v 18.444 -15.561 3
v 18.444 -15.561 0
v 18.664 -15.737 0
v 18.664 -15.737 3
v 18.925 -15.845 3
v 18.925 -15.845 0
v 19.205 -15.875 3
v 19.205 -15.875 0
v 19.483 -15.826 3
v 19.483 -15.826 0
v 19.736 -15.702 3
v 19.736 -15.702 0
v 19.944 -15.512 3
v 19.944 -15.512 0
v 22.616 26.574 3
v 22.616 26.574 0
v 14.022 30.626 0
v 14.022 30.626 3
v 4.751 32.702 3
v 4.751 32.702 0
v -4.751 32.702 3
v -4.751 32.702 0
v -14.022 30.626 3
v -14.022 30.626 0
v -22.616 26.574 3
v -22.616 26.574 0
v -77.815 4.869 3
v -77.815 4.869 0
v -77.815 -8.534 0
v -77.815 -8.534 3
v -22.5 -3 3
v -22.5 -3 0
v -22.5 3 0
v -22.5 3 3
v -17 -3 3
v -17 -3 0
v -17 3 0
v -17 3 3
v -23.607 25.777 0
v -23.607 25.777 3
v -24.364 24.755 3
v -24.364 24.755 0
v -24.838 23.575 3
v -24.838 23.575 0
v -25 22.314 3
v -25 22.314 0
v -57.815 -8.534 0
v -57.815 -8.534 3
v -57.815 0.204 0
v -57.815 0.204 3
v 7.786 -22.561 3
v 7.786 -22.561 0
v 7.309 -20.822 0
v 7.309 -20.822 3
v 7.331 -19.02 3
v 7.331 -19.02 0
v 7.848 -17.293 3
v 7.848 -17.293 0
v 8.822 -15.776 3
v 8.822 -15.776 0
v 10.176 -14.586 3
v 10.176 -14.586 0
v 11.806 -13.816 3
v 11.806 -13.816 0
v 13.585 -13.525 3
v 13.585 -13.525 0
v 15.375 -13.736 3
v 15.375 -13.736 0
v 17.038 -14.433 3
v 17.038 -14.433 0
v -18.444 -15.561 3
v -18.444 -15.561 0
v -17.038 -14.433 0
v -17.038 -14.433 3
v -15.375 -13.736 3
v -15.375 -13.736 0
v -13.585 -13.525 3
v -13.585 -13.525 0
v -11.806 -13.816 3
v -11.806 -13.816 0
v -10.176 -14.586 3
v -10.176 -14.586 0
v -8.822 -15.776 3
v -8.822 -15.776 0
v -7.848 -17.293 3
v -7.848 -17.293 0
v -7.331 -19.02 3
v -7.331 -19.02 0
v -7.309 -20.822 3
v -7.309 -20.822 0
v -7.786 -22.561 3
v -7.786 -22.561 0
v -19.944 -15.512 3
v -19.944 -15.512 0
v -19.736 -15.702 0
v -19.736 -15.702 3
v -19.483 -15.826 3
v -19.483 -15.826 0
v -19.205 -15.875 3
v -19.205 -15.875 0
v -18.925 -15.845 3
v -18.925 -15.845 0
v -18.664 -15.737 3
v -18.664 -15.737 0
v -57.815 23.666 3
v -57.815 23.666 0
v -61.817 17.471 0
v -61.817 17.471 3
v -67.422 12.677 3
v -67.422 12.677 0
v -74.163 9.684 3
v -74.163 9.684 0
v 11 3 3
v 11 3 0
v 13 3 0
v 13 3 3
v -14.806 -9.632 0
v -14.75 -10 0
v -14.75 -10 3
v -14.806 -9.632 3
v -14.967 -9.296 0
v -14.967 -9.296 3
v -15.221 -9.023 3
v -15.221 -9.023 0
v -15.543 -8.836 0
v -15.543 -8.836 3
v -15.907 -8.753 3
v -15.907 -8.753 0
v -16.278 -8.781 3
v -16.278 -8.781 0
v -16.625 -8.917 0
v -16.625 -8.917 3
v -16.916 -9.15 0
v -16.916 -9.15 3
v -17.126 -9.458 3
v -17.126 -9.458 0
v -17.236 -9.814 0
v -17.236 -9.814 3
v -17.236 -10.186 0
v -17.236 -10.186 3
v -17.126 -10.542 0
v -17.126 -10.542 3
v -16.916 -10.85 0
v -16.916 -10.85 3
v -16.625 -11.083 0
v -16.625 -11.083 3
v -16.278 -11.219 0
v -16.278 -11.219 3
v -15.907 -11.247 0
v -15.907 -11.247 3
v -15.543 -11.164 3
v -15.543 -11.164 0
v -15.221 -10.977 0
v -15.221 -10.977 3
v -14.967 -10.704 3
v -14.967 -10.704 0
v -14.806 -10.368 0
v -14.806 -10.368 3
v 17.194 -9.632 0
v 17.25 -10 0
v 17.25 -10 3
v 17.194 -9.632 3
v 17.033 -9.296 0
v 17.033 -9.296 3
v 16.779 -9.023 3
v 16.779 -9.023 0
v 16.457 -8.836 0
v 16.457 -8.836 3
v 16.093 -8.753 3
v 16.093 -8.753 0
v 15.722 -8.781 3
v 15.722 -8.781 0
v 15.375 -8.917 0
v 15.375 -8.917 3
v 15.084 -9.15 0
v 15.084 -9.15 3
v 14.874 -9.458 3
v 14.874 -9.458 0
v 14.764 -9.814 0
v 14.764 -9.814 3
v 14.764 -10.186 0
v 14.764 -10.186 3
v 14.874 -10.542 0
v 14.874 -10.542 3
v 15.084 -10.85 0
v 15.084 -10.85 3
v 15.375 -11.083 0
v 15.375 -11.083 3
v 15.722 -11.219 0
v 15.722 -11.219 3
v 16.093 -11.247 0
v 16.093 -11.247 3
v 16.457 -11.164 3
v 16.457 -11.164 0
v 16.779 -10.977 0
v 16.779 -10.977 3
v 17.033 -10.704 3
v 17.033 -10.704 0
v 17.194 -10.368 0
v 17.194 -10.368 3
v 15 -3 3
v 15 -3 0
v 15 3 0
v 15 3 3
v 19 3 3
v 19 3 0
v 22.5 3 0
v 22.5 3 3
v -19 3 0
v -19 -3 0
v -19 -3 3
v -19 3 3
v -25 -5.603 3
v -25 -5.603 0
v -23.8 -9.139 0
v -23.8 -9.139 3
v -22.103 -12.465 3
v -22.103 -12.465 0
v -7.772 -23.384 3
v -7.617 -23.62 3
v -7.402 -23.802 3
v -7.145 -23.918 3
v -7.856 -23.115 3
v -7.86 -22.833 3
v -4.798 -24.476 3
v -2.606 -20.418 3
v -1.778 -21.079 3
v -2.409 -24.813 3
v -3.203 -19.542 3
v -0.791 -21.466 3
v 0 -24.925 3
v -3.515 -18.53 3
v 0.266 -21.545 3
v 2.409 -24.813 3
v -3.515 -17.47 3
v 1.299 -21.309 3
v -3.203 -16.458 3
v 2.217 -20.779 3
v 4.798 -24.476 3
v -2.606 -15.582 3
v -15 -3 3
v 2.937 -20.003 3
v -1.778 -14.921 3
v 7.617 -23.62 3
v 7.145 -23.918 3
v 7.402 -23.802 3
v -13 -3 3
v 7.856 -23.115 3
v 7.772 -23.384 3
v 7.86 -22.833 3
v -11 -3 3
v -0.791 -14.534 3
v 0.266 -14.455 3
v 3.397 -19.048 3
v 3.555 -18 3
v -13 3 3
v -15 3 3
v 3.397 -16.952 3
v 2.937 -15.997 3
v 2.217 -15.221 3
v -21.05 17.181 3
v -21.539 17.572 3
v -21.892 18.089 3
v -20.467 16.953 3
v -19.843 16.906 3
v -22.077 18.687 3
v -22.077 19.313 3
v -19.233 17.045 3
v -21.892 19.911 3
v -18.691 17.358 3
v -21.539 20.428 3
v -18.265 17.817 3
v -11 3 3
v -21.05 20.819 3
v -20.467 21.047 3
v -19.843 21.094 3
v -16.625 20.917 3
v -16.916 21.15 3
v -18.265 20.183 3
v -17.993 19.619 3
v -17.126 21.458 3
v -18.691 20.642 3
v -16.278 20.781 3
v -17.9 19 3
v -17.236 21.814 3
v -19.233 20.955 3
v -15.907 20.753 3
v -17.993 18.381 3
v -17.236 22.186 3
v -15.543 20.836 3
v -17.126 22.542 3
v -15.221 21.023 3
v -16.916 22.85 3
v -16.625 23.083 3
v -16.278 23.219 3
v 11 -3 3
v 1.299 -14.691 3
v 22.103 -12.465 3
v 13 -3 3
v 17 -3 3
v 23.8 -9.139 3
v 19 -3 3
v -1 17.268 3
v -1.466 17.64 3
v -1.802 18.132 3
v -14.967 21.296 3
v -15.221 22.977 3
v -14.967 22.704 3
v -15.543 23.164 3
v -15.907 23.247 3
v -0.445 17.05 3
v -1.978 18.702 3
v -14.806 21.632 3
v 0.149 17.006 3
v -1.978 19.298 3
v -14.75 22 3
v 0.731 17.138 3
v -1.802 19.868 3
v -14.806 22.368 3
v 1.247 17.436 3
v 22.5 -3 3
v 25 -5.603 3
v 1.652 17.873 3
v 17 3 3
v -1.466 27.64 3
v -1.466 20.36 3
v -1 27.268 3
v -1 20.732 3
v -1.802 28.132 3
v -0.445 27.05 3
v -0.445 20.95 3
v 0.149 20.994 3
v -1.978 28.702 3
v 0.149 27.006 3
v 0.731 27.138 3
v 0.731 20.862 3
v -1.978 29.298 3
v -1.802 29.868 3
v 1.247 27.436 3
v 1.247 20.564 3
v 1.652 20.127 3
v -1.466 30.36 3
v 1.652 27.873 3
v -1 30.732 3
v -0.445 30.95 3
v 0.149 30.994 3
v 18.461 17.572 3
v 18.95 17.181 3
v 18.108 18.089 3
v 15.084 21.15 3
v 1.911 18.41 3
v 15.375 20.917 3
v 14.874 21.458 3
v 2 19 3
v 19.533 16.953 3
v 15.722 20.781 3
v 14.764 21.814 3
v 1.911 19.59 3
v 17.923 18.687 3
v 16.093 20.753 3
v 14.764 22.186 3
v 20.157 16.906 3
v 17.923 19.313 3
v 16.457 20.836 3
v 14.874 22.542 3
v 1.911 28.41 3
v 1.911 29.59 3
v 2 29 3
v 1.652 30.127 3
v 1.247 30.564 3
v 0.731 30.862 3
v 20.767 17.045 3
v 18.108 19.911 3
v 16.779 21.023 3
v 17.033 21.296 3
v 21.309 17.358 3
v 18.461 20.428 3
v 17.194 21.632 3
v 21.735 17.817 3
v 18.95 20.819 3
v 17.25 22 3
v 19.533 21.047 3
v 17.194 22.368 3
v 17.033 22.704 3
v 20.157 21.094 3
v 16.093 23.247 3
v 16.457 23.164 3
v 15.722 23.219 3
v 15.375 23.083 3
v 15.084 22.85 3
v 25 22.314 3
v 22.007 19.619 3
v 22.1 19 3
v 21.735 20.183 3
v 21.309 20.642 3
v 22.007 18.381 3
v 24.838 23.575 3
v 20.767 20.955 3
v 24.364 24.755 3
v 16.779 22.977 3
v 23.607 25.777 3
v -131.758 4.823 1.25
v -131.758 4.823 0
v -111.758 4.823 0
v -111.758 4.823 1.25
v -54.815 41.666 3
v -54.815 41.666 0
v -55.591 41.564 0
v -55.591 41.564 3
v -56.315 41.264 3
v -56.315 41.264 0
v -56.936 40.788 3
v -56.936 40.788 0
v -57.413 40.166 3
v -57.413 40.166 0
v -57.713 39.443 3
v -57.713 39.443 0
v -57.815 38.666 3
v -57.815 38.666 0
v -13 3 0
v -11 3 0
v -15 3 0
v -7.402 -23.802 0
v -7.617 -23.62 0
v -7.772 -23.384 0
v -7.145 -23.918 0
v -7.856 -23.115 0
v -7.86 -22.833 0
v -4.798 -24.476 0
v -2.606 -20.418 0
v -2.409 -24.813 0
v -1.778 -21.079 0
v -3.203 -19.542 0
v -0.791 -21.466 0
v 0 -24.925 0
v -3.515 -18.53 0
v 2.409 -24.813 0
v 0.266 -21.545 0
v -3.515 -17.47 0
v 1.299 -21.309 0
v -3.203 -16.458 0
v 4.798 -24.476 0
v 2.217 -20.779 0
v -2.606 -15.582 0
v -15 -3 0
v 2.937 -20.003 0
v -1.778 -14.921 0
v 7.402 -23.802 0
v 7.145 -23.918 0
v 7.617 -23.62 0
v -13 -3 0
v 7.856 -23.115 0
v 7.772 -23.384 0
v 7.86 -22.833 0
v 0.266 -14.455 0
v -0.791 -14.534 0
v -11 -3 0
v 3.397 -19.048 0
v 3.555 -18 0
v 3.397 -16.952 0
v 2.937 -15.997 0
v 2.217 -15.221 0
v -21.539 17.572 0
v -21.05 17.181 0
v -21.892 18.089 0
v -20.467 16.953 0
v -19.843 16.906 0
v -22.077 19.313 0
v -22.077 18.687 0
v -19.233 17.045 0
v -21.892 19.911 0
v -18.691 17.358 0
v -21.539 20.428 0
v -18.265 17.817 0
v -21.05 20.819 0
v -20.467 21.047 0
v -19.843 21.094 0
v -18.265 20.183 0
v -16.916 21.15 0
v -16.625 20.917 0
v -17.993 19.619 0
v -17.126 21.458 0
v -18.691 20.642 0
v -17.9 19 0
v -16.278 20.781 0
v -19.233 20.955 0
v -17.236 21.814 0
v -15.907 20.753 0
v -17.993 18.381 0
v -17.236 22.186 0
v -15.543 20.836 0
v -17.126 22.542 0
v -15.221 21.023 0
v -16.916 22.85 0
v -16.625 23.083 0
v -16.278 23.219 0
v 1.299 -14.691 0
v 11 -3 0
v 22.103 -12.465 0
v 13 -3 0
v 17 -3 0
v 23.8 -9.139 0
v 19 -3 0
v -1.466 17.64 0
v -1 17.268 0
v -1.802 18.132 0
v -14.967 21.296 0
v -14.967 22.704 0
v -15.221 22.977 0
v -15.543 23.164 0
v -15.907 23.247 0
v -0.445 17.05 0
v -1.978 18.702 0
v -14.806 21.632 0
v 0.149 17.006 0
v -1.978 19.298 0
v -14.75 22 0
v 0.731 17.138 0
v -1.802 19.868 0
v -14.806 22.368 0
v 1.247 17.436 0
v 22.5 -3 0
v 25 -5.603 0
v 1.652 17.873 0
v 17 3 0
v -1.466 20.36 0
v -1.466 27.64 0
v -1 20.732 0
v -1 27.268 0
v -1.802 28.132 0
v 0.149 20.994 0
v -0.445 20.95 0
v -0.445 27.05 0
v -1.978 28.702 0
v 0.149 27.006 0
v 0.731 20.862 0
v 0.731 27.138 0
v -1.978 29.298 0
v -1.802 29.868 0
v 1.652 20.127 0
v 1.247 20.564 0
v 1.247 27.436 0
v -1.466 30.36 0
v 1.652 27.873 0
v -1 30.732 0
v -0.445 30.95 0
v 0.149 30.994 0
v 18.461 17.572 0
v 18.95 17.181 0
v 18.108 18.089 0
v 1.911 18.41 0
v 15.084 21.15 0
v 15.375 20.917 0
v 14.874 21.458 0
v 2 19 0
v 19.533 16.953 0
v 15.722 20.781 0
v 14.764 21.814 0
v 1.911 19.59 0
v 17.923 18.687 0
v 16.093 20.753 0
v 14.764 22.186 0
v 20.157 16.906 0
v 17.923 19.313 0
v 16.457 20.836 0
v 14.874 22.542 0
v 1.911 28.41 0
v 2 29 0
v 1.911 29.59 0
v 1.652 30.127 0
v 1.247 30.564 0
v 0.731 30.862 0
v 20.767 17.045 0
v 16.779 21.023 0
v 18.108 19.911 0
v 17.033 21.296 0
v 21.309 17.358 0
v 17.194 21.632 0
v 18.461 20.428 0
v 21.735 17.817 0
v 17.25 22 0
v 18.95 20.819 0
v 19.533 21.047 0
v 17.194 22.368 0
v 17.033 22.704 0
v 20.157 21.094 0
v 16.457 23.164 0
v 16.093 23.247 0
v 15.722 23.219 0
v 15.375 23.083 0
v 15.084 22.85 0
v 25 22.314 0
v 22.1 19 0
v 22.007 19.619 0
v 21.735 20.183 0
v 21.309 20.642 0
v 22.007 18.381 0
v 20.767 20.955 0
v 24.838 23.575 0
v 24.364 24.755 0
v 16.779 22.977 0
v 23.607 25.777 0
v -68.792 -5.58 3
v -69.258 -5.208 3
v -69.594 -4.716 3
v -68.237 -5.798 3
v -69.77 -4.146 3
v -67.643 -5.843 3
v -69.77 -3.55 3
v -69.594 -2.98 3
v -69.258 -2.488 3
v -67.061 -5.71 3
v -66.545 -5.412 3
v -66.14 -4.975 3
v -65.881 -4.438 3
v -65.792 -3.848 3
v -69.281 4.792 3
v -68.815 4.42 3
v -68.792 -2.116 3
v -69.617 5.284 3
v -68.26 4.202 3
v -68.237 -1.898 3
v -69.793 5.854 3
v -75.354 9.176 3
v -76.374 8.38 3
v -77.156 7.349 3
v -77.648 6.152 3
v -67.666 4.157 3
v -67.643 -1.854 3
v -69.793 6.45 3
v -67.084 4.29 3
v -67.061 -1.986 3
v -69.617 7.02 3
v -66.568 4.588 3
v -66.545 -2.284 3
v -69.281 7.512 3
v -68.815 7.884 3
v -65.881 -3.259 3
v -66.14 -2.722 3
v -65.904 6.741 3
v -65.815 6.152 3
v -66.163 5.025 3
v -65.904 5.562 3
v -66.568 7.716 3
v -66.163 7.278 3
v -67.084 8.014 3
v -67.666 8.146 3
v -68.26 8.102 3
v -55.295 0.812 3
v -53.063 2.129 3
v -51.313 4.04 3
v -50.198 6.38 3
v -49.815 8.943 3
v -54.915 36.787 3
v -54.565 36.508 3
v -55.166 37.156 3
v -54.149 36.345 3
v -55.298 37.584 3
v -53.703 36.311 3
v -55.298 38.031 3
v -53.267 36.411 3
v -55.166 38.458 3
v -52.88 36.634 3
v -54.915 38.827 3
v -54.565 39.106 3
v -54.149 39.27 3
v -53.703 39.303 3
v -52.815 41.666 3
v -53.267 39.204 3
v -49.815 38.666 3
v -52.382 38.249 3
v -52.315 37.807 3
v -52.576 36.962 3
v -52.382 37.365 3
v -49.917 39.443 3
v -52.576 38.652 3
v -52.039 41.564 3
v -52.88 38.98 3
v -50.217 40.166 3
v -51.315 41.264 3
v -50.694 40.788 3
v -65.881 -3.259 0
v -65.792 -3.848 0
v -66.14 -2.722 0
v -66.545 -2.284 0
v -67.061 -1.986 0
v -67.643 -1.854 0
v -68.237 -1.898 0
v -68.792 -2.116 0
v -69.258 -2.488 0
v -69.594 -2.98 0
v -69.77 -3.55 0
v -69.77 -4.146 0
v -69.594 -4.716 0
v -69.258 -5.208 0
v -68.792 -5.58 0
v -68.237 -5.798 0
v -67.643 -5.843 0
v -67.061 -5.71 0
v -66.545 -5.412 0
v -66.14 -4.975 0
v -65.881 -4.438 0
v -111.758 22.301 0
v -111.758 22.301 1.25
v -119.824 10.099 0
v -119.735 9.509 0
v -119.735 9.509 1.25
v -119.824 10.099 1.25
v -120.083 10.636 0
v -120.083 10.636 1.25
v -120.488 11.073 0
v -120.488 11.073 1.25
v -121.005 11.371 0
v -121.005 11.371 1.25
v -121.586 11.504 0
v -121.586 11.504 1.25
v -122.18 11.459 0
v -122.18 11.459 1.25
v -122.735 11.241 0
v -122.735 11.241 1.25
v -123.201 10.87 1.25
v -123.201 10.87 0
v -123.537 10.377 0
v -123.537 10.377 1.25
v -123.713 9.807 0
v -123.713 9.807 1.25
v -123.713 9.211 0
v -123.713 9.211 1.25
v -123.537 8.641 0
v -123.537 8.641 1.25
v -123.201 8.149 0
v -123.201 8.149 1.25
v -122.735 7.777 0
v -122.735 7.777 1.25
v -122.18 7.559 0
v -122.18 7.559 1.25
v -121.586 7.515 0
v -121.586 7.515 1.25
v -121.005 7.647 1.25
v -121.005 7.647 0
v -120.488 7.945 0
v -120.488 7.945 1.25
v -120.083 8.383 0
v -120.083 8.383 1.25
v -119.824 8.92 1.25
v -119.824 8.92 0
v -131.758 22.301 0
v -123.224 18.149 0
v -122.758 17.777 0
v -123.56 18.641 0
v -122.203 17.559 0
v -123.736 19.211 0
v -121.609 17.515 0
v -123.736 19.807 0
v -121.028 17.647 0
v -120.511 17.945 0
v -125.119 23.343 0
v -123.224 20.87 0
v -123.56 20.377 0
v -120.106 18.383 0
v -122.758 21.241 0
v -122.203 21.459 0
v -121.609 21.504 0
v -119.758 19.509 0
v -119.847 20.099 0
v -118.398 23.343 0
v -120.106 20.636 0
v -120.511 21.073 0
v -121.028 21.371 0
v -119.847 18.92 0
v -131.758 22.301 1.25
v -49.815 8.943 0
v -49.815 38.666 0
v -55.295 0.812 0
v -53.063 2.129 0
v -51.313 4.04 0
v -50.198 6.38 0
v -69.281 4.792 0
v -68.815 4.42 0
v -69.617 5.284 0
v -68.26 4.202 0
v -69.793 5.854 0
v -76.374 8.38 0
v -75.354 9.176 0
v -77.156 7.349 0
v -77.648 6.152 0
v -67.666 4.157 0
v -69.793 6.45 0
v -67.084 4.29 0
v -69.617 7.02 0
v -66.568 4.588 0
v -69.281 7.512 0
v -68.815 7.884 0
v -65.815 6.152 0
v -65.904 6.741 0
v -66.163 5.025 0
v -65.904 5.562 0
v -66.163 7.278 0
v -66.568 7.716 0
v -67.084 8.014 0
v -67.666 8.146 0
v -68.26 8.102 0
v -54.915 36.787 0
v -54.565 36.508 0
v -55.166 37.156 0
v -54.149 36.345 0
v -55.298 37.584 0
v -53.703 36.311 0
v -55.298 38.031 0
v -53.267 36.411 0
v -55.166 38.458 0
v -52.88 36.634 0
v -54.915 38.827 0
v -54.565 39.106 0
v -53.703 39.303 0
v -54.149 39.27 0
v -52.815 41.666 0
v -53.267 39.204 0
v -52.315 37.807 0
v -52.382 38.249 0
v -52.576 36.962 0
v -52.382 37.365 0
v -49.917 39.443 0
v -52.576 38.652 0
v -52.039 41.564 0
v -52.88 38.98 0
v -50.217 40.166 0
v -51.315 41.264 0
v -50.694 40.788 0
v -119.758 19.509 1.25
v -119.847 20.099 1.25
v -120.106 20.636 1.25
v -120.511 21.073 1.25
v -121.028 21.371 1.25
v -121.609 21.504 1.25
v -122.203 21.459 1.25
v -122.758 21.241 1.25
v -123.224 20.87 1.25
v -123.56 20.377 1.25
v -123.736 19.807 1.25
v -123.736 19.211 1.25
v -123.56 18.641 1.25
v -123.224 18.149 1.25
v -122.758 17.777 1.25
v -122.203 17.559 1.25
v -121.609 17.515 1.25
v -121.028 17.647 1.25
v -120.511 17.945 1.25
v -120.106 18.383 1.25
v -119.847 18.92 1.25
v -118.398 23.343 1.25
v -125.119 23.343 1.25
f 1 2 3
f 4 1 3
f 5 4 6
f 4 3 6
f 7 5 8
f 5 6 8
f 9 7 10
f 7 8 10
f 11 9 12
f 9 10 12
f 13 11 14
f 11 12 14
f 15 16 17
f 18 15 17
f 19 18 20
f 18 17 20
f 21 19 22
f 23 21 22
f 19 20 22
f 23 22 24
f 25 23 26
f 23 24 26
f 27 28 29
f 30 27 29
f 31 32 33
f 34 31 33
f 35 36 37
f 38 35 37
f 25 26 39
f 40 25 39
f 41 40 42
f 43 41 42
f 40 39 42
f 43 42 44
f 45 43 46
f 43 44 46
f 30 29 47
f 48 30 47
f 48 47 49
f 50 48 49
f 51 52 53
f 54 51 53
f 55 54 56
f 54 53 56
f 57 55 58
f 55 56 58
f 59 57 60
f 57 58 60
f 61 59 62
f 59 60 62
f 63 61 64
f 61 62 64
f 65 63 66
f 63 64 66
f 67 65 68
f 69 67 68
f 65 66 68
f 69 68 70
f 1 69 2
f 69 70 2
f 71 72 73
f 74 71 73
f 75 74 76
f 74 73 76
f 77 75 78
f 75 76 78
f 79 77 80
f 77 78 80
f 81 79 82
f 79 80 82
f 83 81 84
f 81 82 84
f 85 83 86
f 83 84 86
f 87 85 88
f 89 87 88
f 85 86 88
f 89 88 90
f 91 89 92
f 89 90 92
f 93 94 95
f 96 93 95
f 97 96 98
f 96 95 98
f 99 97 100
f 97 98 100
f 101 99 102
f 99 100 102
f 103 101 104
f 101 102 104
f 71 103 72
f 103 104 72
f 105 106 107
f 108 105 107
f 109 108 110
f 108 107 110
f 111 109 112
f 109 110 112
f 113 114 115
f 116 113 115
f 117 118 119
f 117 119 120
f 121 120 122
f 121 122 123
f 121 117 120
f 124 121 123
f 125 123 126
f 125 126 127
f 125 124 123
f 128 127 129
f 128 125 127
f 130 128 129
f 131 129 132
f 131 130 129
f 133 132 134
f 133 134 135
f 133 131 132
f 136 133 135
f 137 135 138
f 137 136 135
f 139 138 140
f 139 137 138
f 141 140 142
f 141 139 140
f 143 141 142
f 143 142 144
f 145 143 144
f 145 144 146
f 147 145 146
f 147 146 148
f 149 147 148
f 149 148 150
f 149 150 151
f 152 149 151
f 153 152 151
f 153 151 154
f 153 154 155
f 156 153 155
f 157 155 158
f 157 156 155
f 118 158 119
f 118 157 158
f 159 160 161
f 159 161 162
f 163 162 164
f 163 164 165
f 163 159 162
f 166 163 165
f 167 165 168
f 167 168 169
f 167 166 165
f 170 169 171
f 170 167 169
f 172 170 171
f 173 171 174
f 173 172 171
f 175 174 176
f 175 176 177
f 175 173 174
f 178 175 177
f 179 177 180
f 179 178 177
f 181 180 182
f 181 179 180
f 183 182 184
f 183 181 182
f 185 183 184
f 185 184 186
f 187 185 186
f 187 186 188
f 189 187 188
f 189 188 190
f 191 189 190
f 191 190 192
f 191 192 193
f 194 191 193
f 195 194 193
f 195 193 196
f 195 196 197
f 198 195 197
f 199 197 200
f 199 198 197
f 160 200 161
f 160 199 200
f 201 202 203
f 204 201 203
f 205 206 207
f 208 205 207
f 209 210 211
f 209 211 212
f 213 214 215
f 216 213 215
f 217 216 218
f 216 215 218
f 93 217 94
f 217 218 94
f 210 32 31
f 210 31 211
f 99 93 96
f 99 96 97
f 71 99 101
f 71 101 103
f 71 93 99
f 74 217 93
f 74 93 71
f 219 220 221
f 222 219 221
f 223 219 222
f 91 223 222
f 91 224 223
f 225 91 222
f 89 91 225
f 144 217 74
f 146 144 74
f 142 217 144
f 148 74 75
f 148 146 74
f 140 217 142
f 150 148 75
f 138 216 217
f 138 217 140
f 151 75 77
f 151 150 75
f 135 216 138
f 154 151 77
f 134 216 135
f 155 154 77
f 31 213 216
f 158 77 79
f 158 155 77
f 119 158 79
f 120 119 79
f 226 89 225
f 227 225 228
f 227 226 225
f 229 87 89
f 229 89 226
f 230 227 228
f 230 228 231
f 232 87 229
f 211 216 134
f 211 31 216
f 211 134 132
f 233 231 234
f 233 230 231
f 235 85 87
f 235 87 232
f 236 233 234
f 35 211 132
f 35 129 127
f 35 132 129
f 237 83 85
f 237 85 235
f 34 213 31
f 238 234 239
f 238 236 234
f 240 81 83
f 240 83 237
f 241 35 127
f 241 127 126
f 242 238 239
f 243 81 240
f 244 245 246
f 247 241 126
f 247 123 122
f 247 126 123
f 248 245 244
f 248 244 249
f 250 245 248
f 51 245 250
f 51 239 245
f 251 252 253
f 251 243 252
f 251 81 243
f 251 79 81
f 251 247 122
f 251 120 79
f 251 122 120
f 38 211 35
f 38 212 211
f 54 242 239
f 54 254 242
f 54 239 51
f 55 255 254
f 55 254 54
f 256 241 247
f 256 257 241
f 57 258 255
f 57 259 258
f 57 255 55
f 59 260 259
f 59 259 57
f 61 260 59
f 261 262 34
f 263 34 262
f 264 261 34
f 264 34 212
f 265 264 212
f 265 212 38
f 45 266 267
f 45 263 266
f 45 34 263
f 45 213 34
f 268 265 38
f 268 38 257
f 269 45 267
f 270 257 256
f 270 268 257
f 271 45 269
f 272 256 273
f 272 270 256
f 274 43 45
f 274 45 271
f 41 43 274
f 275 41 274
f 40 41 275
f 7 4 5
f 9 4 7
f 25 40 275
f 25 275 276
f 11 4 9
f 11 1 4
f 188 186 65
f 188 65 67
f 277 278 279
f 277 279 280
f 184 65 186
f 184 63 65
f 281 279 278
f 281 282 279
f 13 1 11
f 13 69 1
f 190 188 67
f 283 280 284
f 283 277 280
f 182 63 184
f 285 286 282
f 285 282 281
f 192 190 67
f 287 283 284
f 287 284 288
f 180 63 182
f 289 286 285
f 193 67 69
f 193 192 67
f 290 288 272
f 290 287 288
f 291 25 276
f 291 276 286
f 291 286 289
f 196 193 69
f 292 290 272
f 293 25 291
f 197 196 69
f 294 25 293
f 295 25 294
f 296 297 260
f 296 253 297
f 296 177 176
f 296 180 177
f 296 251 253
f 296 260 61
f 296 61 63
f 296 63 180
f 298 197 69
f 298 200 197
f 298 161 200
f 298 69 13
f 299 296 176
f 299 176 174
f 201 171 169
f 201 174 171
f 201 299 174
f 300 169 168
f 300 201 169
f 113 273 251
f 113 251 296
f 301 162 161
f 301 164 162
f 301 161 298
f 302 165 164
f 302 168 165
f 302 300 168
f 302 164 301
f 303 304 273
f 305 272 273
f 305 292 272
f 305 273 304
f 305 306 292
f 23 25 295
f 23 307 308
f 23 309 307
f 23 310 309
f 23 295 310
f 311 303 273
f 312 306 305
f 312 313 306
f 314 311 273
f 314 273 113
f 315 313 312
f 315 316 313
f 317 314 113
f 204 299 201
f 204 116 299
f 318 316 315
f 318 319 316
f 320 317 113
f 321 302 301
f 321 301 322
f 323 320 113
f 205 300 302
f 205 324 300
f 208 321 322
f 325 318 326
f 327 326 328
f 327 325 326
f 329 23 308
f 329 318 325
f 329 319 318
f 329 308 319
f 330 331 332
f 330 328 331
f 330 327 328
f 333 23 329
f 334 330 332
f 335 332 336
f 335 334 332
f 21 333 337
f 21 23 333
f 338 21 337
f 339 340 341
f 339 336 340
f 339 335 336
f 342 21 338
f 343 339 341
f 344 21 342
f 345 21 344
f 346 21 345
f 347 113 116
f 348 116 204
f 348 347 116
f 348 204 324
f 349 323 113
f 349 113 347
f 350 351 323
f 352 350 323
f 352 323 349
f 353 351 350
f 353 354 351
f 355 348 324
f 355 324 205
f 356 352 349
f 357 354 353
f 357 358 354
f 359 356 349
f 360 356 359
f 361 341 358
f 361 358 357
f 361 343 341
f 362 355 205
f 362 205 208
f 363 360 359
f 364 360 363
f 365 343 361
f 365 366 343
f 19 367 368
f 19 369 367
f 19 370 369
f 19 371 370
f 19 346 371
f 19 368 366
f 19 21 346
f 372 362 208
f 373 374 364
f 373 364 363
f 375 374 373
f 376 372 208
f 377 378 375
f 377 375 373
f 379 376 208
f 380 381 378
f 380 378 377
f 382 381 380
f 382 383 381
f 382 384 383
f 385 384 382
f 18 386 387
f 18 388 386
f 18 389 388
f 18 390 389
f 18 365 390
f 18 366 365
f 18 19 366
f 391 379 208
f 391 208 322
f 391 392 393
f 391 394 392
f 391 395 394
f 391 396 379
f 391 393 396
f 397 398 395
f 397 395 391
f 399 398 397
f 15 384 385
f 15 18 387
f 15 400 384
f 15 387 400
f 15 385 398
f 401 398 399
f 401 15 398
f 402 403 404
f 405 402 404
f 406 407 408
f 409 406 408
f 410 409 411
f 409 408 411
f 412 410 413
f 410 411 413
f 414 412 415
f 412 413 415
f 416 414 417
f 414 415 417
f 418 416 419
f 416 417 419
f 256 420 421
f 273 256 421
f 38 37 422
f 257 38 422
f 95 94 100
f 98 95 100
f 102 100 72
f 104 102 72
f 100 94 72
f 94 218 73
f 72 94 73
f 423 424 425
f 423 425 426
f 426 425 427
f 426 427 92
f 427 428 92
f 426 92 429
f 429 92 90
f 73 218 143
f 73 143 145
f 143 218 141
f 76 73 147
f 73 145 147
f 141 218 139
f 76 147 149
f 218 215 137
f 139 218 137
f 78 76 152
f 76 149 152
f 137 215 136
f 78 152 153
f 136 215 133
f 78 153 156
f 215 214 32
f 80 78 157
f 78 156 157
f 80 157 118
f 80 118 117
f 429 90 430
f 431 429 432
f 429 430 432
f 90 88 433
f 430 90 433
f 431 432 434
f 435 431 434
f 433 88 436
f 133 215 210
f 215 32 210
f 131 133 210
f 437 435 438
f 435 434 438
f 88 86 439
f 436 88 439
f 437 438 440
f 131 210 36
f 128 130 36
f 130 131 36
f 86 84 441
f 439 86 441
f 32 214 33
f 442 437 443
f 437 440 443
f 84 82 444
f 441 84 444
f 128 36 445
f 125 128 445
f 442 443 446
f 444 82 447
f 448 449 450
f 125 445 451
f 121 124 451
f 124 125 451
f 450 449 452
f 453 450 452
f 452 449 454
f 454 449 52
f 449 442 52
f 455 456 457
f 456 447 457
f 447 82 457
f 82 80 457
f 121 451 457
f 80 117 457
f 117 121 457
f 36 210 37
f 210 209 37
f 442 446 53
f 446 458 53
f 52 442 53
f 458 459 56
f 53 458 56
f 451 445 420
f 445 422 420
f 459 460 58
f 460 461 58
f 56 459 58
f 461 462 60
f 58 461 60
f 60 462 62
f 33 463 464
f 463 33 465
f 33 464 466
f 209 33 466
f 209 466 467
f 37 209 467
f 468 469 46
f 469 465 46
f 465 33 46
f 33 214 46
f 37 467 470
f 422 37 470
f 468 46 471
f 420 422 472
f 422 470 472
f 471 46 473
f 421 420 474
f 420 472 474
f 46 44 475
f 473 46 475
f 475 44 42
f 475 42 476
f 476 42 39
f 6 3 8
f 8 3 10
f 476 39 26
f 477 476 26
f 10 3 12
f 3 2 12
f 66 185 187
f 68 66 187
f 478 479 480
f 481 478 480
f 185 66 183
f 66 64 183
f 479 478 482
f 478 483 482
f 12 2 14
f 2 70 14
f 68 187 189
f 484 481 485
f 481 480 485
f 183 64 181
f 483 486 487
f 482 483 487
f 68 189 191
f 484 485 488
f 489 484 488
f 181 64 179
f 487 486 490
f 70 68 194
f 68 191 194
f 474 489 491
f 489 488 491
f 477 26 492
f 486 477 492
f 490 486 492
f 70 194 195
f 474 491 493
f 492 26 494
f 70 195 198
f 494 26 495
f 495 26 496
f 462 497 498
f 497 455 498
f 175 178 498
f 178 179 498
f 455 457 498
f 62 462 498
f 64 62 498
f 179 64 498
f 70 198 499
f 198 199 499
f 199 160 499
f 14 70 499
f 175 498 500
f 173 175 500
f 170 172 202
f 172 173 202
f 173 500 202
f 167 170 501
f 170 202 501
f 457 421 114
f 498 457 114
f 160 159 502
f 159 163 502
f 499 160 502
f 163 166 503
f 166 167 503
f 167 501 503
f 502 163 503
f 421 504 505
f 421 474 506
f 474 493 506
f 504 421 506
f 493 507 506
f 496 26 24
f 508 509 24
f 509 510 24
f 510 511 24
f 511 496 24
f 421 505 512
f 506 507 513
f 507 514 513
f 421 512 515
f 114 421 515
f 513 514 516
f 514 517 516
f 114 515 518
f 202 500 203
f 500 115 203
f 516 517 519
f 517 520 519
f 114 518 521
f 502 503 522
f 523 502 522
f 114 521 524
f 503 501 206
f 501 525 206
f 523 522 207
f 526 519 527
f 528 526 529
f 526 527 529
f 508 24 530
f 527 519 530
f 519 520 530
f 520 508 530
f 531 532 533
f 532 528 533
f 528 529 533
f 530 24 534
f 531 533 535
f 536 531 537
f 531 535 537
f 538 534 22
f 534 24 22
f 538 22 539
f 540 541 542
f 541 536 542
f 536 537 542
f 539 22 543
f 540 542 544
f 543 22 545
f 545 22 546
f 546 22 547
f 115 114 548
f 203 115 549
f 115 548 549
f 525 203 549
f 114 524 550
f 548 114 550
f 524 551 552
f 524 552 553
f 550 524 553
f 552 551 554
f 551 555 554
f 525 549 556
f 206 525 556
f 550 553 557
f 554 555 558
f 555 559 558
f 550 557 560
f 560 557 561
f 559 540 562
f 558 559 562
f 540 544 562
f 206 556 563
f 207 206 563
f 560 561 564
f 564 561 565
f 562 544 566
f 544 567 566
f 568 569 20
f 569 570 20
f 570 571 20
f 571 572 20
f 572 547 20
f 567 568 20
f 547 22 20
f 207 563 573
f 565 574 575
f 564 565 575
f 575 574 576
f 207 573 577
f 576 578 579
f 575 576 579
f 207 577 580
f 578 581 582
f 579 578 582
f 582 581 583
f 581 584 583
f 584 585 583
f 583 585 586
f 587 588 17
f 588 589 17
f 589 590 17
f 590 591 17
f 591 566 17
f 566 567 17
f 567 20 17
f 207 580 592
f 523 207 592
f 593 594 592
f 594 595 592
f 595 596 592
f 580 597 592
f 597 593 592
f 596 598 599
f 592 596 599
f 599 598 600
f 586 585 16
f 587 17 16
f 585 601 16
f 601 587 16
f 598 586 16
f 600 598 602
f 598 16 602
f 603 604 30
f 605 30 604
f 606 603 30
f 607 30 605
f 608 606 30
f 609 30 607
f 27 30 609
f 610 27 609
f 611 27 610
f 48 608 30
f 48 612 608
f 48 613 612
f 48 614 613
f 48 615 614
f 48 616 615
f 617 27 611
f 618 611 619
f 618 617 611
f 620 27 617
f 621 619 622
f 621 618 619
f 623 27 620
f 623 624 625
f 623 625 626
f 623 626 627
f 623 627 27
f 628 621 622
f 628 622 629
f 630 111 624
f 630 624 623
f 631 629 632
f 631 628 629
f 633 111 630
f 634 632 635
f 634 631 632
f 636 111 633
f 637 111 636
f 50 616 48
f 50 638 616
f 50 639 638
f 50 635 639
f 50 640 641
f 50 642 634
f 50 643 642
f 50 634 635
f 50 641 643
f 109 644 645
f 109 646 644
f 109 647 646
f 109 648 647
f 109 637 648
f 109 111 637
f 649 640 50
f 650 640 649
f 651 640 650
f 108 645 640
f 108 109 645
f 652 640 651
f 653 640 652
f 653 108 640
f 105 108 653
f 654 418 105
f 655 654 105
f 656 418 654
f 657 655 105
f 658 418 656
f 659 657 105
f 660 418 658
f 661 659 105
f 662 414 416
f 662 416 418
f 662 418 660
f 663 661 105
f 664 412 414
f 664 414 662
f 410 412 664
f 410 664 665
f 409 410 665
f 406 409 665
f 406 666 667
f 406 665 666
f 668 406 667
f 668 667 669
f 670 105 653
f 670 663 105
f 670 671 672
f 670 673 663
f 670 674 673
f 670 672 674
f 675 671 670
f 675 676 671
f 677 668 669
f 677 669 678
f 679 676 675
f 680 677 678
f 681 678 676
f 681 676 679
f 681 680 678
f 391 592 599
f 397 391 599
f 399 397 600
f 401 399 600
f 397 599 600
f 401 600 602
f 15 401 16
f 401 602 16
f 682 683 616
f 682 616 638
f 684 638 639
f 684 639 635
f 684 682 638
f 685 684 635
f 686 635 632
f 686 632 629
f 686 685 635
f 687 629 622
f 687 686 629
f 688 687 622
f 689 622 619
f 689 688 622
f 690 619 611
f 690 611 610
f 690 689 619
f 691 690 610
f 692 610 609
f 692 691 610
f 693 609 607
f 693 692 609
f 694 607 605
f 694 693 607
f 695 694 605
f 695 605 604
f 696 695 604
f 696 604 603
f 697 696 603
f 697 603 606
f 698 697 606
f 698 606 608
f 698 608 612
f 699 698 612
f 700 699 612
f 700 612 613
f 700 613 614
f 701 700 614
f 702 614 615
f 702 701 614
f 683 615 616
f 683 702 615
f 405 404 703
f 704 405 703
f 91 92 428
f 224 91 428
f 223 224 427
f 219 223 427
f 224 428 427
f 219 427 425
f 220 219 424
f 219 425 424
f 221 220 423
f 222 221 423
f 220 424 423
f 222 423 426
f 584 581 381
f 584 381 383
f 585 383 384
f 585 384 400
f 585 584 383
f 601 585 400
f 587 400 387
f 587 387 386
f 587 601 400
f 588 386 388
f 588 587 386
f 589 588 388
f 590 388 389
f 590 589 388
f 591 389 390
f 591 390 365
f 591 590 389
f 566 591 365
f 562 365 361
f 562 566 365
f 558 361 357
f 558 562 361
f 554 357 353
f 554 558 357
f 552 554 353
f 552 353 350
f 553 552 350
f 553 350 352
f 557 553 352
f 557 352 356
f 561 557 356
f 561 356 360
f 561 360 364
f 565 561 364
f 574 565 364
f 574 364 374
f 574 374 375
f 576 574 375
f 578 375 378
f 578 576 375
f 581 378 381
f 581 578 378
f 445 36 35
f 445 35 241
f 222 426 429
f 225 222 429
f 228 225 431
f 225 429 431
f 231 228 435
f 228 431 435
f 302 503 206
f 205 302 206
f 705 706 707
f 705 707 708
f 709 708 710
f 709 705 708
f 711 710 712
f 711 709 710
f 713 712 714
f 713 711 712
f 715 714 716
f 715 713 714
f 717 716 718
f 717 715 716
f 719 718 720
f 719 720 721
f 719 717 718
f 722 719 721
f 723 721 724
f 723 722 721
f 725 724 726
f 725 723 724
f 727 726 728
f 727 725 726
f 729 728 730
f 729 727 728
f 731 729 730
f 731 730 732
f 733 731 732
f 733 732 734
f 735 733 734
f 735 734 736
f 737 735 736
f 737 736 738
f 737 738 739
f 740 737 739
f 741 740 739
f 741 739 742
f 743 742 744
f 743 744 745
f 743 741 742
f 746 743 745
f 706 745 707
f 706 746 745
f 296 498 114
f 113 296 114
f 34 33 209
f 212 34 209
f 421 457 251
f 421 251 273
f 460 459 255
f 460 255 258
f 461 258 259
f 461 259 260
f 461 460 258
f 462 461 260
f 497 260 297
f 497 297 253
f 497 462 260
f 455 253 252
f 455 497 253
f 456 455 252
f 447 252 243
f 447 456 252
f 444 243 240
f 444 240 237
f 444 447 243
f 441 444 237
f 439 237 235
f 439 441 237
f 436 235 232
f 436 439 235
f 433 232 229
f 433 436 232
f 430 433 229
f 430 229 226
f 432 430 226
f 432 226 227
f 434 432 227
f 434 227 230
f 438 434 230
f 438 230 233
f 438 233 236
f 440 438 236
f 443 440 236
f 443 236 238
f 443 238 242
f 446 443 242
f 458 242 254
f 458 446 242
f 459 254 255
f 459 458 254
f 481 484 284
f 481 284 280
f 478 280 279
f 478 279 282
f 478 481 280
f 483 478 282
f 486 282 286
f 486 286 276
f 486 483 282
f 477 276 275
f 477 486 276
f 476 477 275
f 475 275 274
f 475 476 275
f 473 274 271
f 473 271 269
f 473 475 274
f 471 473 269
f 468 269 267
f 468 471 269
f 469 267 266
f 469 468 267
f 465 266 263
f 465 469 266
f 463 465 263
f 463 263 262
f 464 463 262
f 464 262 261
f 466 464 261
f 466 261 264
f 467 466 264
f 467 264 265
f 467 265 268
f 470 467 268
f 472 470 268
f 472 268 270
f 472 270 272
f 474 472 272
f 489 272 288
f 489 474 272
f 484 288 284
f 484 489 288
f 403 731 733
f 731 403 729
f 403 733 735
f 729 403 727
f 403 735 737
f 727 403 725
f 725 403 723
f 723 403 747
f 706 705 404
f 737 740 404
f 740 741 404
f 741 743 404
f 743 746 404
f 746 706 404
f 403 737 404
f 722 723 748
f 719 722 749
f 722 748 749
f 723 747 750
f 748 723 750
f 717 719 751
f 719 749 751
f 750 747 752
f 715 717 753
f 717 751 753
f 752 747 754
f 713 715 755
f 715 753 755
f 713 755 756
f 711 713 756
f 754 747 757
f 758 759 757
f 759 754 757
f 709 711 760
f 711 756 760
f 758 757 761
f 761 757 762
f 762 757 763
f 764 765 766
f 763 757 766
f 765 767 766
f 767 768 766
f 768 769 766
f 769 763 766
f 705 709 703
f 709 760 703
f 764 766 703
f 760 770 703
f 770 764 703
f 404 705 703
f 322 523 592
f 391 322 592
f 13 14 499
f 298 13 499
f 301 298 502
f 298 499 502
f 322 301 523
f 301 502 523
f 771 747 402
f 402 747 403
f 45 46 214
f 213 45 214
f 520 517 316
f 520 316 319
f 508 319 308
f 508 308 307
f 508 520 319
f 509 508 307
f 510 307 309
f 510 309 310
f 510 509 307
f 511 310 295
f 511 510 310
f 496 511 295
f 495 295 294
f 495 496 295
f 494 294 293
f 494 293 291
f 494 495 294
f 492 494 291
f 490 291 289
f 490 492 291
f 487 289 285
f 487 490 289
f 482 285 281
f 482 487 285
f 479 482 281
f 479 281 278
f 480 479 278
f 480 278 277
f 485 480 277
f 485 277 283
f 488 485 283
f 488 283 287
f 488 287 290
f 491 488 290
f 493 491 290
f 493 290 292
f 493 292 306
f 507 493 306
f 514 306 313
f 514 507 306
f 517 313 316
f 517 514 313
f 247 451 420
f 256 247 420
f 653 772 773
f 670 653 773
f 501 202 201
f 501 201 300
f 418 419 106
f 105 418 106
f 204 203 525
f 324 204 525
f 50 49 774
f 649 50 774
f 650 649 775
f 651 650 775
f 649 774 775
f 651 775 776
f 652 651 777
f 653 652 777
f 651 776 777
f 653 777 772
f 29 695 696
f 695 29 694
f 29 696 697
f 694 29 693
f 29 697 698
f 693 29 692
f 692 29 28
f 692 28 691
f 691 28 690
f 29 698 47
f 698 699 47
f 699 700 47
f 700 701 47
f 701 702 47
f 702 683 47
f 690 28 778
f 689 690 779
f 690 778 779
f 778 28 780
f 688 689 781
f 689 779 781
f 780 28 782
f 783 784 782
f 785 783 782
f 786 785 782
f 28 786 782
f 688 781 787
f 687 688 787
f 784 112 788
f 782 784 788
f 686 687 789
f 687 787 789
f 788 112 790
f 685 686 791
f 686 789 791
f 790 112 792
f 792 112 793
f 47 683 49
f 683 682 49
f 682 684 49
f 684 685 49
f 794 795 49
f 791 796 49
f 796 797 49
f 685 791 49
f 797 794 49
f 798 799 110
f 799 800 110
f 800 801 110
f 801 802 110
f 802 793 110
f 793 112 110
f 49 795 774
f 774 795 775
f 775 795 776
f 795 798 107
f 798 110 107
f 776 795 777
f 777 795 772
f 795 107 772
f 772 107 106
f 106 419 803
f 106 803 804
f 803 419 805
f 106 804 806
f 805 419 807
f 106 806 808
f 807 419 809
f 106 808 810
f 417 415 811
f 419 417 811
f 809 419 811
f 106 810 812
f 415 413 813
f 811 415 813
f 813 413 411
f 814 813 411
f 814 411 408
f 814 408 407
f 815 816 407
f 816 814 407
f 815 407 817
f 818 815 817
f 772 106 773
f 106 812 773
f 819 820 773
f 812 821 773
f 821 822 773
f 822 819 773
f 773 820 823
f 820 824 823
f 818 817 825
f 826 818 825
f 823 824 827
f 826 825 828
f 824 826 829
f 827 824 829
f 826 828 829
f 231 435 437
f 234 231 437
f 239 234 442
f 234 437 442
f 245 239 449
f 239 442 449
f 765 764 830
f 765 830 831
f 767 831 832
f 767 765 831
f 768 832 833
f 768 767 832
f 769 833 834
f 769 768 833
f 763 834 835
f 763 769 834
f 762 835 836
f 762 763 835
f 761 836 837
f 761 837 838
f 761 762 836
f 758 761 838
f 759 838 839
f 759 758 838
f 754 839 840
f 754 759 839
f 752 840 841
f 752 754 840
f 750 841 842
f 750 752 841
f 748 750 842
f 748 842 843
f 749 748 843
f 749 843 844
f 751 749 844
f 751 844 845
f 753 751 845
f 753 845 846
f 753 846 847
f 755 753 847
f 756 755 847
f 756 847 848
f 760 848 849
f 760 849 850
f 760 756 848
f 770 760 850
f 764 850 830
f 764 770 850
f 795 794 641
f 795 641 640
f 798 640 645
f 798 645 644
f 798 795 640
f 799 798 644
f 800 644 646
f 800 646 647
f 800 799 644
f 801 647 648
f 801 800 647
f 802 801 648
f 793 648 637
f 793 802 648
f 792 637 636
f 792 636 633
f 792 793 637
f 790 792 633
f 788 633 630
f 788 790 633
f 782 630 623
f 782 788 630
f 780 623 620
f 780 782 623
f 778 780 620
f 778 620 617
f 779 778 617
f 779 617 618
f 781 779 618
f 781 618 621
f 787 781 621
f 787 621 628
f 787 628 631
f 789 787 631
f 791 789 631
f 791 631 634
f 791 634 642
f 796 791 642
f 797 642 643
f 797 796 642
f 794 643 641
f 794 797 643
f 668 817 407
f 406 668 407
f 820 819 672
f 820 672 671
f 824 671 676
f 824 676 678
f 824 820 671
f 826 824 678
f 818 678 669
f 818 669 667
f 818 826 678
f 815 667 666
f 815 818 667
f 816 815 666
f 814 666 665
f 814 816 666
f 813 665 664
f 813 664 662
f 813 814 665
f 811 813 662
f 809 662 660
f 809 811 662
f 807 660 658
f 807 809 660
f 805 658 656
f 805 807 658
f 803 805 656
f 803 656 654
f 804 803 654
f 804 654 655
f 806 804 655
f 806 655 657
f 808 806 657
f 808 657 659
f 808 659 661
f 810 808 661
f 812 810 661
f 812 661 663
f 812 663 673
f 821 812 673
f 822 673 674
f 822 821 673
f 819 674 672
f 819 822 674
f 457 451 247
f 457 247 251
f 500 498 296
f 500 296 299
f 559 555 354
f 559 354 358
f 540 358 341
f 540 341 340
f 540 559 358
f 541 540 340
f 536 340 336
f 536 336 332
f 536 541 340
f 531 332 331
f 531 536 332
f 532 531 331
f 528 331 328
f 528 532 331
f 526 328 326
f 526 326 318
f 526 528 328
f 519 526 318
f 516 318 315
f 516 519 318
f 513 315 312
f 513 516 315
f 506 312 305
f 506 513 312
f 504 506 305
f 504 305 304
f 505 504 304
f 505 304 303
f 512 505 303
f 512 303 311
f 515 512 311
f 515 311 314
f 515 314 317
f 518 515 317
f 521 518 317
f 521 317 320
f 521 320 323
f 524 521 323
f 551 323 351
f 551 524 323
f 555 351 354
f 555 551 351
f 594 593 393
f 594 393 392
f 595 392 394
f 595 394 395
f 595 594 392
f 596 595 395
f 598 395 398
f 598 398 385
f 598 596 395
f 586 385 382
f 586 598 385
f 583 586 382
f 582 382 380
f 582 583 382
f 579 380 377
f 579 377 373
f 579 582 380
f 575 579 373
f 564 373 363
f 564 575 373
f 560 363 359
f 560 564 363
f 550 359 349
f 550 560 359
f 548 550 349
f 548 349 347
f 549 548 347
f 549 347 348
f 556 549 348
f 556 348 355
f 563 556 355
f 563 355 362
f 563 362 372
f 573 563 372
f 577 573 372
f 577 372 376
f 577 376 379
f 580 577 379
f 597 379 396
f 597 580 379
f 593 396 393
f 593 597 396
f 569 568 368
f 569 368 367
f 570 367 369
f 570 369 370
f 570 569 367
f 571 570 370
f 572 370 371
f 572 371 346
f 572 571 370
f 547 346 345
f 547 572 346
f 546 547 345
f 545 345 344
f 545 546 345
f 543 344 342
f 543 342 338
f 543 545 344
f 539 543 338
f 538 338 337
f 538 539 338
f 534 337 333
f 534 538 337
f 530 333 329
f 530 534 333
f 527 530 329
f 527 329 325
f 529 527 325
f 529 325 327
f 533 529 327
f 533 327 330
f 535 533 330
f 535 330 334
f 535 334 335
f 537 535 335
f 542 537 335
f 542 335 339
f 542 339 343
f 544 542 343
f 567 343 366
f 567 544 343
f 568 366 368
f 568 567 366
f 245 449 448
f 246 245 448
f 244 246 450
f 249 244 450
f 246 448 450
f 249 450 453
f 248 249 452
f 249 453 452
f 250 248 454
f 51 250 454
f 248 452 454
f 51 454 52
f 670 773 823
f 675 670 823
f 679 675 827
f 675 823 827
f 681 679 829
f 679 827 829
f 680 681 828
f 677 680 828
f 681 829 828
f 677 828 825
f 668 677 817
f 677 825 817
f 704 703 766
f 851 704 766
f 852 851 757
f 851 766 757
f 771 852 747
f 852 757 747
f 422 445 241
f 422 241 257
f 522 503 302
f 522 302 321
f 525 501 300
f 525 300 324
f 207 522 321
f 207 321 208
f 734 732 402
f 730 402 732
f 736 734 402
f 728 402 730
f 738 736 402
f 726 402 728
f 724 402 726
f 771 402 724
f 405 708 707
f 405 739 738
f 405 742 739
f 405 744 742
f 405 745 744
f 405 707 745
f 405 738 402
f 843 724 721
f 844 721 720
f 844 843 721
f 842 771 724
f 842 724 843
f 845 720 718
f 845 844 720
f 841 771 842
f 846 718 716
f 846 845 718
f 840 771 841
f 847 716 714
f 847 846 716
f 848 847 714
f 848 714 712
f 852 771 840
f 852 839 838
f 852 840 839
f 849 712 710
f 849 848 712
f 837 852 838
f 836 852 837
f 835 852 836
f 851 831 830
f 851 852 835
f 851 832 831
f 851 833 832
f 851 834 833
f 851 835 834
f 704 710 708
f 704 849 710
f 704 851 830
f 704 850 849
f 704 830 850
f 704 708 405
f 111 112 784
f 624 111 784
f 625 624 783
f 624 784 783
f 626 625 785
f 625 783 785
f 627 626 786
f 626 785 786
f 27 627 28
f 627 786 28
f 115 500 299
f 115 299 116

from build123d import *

# Parameters (mm, degrees)
F0_R     = 1.25
F0_R_2   = 3.555
F0_W     = 3.5
F0_H     = 6
F0_W_2   = 2
F0_R_3   = 2.1
F0_R_4   = 2
F1_DEPTH = 3
F0_R_5   = 1.5
F2_DEPTH = 3
F4_R     = 2.1
F4_R_2   = 2.25
F5_DEPTH = 25
F6_DEPTH = 1.25


# Not quite as in the source:
# - a feature names something its author has since deleted; it is built from what else it names


with BuildPart() as f1:
    # F0 (on Top) → F1 (new body)
    with BuildSketch(Plane.XY):
        with BuildLine():
            Line((25, 14.3136761677), (-25, 14.3136761677))
            Line((-25, 14.3136761677), (-25, -5.6028405869))
            ThreePointArc((-25, -5.6028405869), (-23.0117824833, -10.8325706042), (-19.9442440013, -15.5115974911))
            ThreePointArc((-19.9442440013, -15.5115974911), (-19.2052482882, -15.8754446325), (-18.443850882, -15.5611622815))
            ThreePointArc((-18.443850882, -15.5611622815), (-10.1760612052, -14.5858281895), (-7.7862204272, -22.5605560084))
            ThreePointArc((-7.7862204272, -22.5605560084), (-7.7721201862, -23.38414607), (-7.1446119827, -23.9177497252))
            ThreePointArc((-7.1446119827, -23.9177497252), (-3.6076561704, -24.6722072912), (0, -24.9253467642))
            ThreePointArc((0, -24.9253467642), (3.6076561704, -24.6722072912), (7.1446119827, -23.9177497252))
            ThreePointArc((7.1446119827, -23.9177497252), (7.7721201862, -23.38414607), (7.7862204272, -22.5605560084))
            ThreePointArc((7.7862204272, -22.5605560084), (10.1760612052, -14.5858281895), (18.443850882, -15.5611622815))
            ThreePointArc((18.443850882, -15.5611622815), (19.2052482882, -15.8754446325), (19.9442440013, -15.5115974911))
            ThreePointArc((19.9442440013, -15.5115974911), (23.0117824833, -10.8325706042), (25, -5.6028405869))
            Line((25, -5.6028405869), (25, 14.3136761677))
        make_face()
        with Locations((-16, -10)):
            Circle(F0_R, mode=Mode.SUBTRACT)
        with Locations((0, -18)):
            Circle(F0_R_2, mode=Mode.SUBTRACT)
        with Locations((16, -10)):
            Circle(F0_R, mode=Mode.SUBTRACT)
        with Locations((-20.75, 0)):
            Rectangle(F0_W, F0_H, mode=Mode.SUBTRACT)
        with Locations((-16, 0)):
            Rectangle(F0_W_2, F0_H, mode=Mode.SUBTRACT)
        with Locations((-12, 0)):
            Rectangle(F0_W_2, F0_H, mode=Mode.SUBTRACT)
        with Locations((12, 0)):
            Rectangle(F0_W_2, F0_H, mode=Mode.SUBTRACT)
        with Locations((16, 0)):
            Rectangle(F0_W_2, F0_H, mode=Mode.SUBTRACT)
        with Locations((20.75, 0)):
            Rectangle(F0_W, F0_H, mode=Mode.SUBTRACT)
        with BuildLine():
            ThreePointArc((-22.6164226719, 26.5744662824), (-24.3636059263, 24.7547708647), (-25, 22.3136761677))
            Line((-25, 22.3136761677), (-25, 14.3136761677))
            Line((-25, 14.3136761677), (25, 14.3136761677))
            Line((25, 14.3136761677), (25, 22.3136761677))
            ThreePointArc((25, 22.3136761677), (24.3636059263, 24.7547708647), (22.6164226719, 26.5744662824))
            ThreePointArc((22.6164226719, 26.5744662824), (0, 32.964214922), (-22.6164226719, 26.5744662824))
        make_face()
        with Locations((-20, 19)):
            Circle(F0_R_3, mode=Mode.SUBTRACT)
        with Locations((-16, 22)):
            Circle(F0_R, mode=Mode.SUBTRACT)
        with Locations((0, 19)):
            Circle(F0_R_4, mode=Mode.SUBTRACT)
        with Locations((20, 19)):
            Circle(F0_R_3, mode=Mode.SUBTRACT)
        with Locations((16, 22)):
            Circle(F0_R, mode=Mode.SUBTRACT)
        with Locations((0, 29)):
            Circle(F0_R_4, mode=Mode.SUBTRACT)
    extrude(amount=F1_DEPTH)


with BuildPart() as f1b:
    # F0 (on Top) → F1, piece 2 (new body)
    with BuildSketch(Plane.XY):
        with BuildLine():
            Line((-77.8149985122, 4.86868793), (-77.8149985122, -8.5344709849))
            Line((-77.8149985122, -8.5344709849), (-57.8149985122, -8.5344709849))
            Line((-57.8149985122, -8.5344709849), (-57.8149985122, 0.2044082856))
            ThreePointArc((-57.8149985122, 0.2044082856), (-52.1170226198, 3.0194368328), (-49.8149985122, 8.9432869322))
            Line((-49.8149985122, 8.9432869322), (-49.8149985122, 38.6662318432))
            ThreePointArc((-49.8149985122, 38.6662318432), (-50.6936781686, 40.7875521867), (-52.8149985122, 41.6662318432))
            Line((-52.8149985122, 41.6662318432), (-54.8149985122, 41.6662318432))
            ThreePointArc((-54.8149985122, 41.6662318432), (-56.9363188557, 40.7875521867), (-57.8149985122, 38.6662318432))
            Line((-57.8149985122, 38.6662318432), (-57.8149985122, 23.6662318432))
            ThreePointArc((-57.8149985122, 23.6662318432), (-64.445474594, 14.8702366754), (-74.1630322412, 9.6835404787))
            ThreePointArc((-74.1630322412, 9.6835404787), (-76.798725953, 7.8902629626), (-77.8149985122, 4.86868793))
        make_face()
        with Locations((-67.7919896514, -3.8481471525)):
            Circle(F0_R_4, mode=Mode.SUBTRACT)
        with Locations((-67.8149985122, 6.1518528475)):
            Circle(F0_R_4, mode=Mode.SUBTRACT)
        with Locations((-53.8149985122, 37.8072073483)):
            Circle(F0_R_5, mode=Mode.SUBTRACT)
    extrude(amount=F1_DEPTH)


with BuildPart() as f2:
    # F0 (on Top) → F2 (new body)
    with BuildSketch(Plane.XY):
        with BuildLine():
            ThreePointArc((-22.6164226719, 26.5744662824), (-24.3636059263, 24.7547708647), (-25, 22.3136761677))
            Line((-25, 22.3136761677), (-25, 14.3136761677))
            Line((-25, 14.3136761677), (25, 14.3136761677))
            Line((25, 14.3136761677), (25, 22.3136761677))
            ThreePointArc((25, 22.3136761677), (24.3636059263, 24.7547708647), (22.6164226719, 26.5744662824))
            ThreePointArc((22.6164226719, 26.5744662824), (0, 32.964214922), (-22.6164226719, 26.5744662824))
        make_face()
        with Locations((-20, 19)):
            Circle(F0_R_3, mode=Mode.SUBTRACT)
        with Locations((-16, 22)):
            Circle(F0_R, mode=Mode.SUBTRACT)
        with Locations((0, 19)):
            Circle(F0_R_4, mode=Mode.SUBTRACT)
        with Locations((20, 19)):
            Circle(F0_R_3, mode=Mode.SUBTRACT)
        with Locations((16, 22)):
            Circle(F0_R, mode=Mode.SUBTRACT)
        with Locations((0, 29)):
            Circle(F0_R_4, mode=Mode.SUBTRACT)
        with Locations((-16, 22)):
            Circle(F0_R)
        with Locations((16, 22)):
            Circle(F0_R)
    extrude(amount=F2_DEPTH)


with BuildPart() as f2_1:
    # F3: moved
    add(f2.part.moved(Location((55.75, 0, 0))))

    # F4 (on face) → F5 (cut)
    with BuildSketch(Plane.XY.offset(3)):
        with BuildLine():
            Line((30.75, 14.3136761677), (45.75, 14.3136761677))
            Line((45.75, 14.3136761677), (45.75, 25.7562933257))
            ThreePointArc((45.75, 25.7562933257), (46.2050390496, 27.8403590538), (47.4873319836, 29.5450922667))
            ThreePointArc((47.4873319836, 29.5450922667), (51.3440284338, 31.9183440188), (55.75, 32.964214922))
            ThreePointArc((55.75, 32.964214922), (43.9991334133, 31.3361124445), (33.1335773281, 26.5744662824))
            ThreePointArc((33.1335773281, 26.5744662824), (31.3863940737, 24.7547708647), (30.75, 22.3136761677))
            Line((30.75, 22.3136761677), (30.75, 14.3136761677))
        make_face()
        with Locations((35.75, 19)):
            Circle(F4_R, mode=Mode.SUBTRACT)
        with Locations((42.75, 19)):
            Circle(F4_R_2, mode=Mode.SUBTRACT)
        with BuildLine():
            ThreePointArc((58.8838195988, 32.8504511649), (60.9470746388, 32.3880346997), (62.9193889887, 31.6259149894))
            ThreePointArc((62.9193889887, 31.6259149894), (70.6461883393, 24.5054009937), (73.2023363863, 14.3136761677))
            Line((73.2023363863, 14.3136761677), (80.75, 14.3136761677))
            Line((80.75, 14.3136761677), (80.75, 22.3136761677))
            ThreePointArc((80.75, 22.3136761677), (80.1136059263, 24.7547708647), (78.3664226719, 26.5744662824))
            ThreePointArc((78.3664226719, 26.5744662824), (69.0020089349, 30.8824353153), (58.8838195988, 32.8504511649))
        make_face()
        with Locations((75.75, 19)):
            Circle(F4_R, mode=Mode.SUBTRACT)
        with Locations((42.75, 19)):
            Circle(F4_R_2)
        with Locations((68.75, 19)):
            Circle(F4_R_2)
    extrude(amount=-F5_DEPTH, mode=Mode.SUBTRACT)


with BuildPart() as f6:
    # F0 (on Top) → F6 (new body)
    with BuildSketch(Plane.XY):
        with BuildLine():
            Line((-111.7582723053, 4.8228372639), (-111.7582723053, 22.3005958048))
            ThreePointArc((-111.7582723053, 22.3005958048), (-121.7582723053, 23.4733760182), (-131.7582723053, 22.3005958048))
            Line((-131.7582723053, 22.3005958048), (-131.7582723053, 4.8228372639))
            Line((-131.7582723053, 4.8228372639), (-111.7582723053, 4.8228372639))
        make_face()
        with Locations((-121.7352634446, 9.5091610962)):
            Circle(F0_R_4, mode=Mode.SUBTRACT)
        with Locations((-121.7582723053, 19.5091610962)):
            Circle(F0_R_4, mode=Mode.SUBTRACT)
    extrude(amount=F6_DEPTH)


solid = Compound([f1.part, f1b.part, f6.part])
